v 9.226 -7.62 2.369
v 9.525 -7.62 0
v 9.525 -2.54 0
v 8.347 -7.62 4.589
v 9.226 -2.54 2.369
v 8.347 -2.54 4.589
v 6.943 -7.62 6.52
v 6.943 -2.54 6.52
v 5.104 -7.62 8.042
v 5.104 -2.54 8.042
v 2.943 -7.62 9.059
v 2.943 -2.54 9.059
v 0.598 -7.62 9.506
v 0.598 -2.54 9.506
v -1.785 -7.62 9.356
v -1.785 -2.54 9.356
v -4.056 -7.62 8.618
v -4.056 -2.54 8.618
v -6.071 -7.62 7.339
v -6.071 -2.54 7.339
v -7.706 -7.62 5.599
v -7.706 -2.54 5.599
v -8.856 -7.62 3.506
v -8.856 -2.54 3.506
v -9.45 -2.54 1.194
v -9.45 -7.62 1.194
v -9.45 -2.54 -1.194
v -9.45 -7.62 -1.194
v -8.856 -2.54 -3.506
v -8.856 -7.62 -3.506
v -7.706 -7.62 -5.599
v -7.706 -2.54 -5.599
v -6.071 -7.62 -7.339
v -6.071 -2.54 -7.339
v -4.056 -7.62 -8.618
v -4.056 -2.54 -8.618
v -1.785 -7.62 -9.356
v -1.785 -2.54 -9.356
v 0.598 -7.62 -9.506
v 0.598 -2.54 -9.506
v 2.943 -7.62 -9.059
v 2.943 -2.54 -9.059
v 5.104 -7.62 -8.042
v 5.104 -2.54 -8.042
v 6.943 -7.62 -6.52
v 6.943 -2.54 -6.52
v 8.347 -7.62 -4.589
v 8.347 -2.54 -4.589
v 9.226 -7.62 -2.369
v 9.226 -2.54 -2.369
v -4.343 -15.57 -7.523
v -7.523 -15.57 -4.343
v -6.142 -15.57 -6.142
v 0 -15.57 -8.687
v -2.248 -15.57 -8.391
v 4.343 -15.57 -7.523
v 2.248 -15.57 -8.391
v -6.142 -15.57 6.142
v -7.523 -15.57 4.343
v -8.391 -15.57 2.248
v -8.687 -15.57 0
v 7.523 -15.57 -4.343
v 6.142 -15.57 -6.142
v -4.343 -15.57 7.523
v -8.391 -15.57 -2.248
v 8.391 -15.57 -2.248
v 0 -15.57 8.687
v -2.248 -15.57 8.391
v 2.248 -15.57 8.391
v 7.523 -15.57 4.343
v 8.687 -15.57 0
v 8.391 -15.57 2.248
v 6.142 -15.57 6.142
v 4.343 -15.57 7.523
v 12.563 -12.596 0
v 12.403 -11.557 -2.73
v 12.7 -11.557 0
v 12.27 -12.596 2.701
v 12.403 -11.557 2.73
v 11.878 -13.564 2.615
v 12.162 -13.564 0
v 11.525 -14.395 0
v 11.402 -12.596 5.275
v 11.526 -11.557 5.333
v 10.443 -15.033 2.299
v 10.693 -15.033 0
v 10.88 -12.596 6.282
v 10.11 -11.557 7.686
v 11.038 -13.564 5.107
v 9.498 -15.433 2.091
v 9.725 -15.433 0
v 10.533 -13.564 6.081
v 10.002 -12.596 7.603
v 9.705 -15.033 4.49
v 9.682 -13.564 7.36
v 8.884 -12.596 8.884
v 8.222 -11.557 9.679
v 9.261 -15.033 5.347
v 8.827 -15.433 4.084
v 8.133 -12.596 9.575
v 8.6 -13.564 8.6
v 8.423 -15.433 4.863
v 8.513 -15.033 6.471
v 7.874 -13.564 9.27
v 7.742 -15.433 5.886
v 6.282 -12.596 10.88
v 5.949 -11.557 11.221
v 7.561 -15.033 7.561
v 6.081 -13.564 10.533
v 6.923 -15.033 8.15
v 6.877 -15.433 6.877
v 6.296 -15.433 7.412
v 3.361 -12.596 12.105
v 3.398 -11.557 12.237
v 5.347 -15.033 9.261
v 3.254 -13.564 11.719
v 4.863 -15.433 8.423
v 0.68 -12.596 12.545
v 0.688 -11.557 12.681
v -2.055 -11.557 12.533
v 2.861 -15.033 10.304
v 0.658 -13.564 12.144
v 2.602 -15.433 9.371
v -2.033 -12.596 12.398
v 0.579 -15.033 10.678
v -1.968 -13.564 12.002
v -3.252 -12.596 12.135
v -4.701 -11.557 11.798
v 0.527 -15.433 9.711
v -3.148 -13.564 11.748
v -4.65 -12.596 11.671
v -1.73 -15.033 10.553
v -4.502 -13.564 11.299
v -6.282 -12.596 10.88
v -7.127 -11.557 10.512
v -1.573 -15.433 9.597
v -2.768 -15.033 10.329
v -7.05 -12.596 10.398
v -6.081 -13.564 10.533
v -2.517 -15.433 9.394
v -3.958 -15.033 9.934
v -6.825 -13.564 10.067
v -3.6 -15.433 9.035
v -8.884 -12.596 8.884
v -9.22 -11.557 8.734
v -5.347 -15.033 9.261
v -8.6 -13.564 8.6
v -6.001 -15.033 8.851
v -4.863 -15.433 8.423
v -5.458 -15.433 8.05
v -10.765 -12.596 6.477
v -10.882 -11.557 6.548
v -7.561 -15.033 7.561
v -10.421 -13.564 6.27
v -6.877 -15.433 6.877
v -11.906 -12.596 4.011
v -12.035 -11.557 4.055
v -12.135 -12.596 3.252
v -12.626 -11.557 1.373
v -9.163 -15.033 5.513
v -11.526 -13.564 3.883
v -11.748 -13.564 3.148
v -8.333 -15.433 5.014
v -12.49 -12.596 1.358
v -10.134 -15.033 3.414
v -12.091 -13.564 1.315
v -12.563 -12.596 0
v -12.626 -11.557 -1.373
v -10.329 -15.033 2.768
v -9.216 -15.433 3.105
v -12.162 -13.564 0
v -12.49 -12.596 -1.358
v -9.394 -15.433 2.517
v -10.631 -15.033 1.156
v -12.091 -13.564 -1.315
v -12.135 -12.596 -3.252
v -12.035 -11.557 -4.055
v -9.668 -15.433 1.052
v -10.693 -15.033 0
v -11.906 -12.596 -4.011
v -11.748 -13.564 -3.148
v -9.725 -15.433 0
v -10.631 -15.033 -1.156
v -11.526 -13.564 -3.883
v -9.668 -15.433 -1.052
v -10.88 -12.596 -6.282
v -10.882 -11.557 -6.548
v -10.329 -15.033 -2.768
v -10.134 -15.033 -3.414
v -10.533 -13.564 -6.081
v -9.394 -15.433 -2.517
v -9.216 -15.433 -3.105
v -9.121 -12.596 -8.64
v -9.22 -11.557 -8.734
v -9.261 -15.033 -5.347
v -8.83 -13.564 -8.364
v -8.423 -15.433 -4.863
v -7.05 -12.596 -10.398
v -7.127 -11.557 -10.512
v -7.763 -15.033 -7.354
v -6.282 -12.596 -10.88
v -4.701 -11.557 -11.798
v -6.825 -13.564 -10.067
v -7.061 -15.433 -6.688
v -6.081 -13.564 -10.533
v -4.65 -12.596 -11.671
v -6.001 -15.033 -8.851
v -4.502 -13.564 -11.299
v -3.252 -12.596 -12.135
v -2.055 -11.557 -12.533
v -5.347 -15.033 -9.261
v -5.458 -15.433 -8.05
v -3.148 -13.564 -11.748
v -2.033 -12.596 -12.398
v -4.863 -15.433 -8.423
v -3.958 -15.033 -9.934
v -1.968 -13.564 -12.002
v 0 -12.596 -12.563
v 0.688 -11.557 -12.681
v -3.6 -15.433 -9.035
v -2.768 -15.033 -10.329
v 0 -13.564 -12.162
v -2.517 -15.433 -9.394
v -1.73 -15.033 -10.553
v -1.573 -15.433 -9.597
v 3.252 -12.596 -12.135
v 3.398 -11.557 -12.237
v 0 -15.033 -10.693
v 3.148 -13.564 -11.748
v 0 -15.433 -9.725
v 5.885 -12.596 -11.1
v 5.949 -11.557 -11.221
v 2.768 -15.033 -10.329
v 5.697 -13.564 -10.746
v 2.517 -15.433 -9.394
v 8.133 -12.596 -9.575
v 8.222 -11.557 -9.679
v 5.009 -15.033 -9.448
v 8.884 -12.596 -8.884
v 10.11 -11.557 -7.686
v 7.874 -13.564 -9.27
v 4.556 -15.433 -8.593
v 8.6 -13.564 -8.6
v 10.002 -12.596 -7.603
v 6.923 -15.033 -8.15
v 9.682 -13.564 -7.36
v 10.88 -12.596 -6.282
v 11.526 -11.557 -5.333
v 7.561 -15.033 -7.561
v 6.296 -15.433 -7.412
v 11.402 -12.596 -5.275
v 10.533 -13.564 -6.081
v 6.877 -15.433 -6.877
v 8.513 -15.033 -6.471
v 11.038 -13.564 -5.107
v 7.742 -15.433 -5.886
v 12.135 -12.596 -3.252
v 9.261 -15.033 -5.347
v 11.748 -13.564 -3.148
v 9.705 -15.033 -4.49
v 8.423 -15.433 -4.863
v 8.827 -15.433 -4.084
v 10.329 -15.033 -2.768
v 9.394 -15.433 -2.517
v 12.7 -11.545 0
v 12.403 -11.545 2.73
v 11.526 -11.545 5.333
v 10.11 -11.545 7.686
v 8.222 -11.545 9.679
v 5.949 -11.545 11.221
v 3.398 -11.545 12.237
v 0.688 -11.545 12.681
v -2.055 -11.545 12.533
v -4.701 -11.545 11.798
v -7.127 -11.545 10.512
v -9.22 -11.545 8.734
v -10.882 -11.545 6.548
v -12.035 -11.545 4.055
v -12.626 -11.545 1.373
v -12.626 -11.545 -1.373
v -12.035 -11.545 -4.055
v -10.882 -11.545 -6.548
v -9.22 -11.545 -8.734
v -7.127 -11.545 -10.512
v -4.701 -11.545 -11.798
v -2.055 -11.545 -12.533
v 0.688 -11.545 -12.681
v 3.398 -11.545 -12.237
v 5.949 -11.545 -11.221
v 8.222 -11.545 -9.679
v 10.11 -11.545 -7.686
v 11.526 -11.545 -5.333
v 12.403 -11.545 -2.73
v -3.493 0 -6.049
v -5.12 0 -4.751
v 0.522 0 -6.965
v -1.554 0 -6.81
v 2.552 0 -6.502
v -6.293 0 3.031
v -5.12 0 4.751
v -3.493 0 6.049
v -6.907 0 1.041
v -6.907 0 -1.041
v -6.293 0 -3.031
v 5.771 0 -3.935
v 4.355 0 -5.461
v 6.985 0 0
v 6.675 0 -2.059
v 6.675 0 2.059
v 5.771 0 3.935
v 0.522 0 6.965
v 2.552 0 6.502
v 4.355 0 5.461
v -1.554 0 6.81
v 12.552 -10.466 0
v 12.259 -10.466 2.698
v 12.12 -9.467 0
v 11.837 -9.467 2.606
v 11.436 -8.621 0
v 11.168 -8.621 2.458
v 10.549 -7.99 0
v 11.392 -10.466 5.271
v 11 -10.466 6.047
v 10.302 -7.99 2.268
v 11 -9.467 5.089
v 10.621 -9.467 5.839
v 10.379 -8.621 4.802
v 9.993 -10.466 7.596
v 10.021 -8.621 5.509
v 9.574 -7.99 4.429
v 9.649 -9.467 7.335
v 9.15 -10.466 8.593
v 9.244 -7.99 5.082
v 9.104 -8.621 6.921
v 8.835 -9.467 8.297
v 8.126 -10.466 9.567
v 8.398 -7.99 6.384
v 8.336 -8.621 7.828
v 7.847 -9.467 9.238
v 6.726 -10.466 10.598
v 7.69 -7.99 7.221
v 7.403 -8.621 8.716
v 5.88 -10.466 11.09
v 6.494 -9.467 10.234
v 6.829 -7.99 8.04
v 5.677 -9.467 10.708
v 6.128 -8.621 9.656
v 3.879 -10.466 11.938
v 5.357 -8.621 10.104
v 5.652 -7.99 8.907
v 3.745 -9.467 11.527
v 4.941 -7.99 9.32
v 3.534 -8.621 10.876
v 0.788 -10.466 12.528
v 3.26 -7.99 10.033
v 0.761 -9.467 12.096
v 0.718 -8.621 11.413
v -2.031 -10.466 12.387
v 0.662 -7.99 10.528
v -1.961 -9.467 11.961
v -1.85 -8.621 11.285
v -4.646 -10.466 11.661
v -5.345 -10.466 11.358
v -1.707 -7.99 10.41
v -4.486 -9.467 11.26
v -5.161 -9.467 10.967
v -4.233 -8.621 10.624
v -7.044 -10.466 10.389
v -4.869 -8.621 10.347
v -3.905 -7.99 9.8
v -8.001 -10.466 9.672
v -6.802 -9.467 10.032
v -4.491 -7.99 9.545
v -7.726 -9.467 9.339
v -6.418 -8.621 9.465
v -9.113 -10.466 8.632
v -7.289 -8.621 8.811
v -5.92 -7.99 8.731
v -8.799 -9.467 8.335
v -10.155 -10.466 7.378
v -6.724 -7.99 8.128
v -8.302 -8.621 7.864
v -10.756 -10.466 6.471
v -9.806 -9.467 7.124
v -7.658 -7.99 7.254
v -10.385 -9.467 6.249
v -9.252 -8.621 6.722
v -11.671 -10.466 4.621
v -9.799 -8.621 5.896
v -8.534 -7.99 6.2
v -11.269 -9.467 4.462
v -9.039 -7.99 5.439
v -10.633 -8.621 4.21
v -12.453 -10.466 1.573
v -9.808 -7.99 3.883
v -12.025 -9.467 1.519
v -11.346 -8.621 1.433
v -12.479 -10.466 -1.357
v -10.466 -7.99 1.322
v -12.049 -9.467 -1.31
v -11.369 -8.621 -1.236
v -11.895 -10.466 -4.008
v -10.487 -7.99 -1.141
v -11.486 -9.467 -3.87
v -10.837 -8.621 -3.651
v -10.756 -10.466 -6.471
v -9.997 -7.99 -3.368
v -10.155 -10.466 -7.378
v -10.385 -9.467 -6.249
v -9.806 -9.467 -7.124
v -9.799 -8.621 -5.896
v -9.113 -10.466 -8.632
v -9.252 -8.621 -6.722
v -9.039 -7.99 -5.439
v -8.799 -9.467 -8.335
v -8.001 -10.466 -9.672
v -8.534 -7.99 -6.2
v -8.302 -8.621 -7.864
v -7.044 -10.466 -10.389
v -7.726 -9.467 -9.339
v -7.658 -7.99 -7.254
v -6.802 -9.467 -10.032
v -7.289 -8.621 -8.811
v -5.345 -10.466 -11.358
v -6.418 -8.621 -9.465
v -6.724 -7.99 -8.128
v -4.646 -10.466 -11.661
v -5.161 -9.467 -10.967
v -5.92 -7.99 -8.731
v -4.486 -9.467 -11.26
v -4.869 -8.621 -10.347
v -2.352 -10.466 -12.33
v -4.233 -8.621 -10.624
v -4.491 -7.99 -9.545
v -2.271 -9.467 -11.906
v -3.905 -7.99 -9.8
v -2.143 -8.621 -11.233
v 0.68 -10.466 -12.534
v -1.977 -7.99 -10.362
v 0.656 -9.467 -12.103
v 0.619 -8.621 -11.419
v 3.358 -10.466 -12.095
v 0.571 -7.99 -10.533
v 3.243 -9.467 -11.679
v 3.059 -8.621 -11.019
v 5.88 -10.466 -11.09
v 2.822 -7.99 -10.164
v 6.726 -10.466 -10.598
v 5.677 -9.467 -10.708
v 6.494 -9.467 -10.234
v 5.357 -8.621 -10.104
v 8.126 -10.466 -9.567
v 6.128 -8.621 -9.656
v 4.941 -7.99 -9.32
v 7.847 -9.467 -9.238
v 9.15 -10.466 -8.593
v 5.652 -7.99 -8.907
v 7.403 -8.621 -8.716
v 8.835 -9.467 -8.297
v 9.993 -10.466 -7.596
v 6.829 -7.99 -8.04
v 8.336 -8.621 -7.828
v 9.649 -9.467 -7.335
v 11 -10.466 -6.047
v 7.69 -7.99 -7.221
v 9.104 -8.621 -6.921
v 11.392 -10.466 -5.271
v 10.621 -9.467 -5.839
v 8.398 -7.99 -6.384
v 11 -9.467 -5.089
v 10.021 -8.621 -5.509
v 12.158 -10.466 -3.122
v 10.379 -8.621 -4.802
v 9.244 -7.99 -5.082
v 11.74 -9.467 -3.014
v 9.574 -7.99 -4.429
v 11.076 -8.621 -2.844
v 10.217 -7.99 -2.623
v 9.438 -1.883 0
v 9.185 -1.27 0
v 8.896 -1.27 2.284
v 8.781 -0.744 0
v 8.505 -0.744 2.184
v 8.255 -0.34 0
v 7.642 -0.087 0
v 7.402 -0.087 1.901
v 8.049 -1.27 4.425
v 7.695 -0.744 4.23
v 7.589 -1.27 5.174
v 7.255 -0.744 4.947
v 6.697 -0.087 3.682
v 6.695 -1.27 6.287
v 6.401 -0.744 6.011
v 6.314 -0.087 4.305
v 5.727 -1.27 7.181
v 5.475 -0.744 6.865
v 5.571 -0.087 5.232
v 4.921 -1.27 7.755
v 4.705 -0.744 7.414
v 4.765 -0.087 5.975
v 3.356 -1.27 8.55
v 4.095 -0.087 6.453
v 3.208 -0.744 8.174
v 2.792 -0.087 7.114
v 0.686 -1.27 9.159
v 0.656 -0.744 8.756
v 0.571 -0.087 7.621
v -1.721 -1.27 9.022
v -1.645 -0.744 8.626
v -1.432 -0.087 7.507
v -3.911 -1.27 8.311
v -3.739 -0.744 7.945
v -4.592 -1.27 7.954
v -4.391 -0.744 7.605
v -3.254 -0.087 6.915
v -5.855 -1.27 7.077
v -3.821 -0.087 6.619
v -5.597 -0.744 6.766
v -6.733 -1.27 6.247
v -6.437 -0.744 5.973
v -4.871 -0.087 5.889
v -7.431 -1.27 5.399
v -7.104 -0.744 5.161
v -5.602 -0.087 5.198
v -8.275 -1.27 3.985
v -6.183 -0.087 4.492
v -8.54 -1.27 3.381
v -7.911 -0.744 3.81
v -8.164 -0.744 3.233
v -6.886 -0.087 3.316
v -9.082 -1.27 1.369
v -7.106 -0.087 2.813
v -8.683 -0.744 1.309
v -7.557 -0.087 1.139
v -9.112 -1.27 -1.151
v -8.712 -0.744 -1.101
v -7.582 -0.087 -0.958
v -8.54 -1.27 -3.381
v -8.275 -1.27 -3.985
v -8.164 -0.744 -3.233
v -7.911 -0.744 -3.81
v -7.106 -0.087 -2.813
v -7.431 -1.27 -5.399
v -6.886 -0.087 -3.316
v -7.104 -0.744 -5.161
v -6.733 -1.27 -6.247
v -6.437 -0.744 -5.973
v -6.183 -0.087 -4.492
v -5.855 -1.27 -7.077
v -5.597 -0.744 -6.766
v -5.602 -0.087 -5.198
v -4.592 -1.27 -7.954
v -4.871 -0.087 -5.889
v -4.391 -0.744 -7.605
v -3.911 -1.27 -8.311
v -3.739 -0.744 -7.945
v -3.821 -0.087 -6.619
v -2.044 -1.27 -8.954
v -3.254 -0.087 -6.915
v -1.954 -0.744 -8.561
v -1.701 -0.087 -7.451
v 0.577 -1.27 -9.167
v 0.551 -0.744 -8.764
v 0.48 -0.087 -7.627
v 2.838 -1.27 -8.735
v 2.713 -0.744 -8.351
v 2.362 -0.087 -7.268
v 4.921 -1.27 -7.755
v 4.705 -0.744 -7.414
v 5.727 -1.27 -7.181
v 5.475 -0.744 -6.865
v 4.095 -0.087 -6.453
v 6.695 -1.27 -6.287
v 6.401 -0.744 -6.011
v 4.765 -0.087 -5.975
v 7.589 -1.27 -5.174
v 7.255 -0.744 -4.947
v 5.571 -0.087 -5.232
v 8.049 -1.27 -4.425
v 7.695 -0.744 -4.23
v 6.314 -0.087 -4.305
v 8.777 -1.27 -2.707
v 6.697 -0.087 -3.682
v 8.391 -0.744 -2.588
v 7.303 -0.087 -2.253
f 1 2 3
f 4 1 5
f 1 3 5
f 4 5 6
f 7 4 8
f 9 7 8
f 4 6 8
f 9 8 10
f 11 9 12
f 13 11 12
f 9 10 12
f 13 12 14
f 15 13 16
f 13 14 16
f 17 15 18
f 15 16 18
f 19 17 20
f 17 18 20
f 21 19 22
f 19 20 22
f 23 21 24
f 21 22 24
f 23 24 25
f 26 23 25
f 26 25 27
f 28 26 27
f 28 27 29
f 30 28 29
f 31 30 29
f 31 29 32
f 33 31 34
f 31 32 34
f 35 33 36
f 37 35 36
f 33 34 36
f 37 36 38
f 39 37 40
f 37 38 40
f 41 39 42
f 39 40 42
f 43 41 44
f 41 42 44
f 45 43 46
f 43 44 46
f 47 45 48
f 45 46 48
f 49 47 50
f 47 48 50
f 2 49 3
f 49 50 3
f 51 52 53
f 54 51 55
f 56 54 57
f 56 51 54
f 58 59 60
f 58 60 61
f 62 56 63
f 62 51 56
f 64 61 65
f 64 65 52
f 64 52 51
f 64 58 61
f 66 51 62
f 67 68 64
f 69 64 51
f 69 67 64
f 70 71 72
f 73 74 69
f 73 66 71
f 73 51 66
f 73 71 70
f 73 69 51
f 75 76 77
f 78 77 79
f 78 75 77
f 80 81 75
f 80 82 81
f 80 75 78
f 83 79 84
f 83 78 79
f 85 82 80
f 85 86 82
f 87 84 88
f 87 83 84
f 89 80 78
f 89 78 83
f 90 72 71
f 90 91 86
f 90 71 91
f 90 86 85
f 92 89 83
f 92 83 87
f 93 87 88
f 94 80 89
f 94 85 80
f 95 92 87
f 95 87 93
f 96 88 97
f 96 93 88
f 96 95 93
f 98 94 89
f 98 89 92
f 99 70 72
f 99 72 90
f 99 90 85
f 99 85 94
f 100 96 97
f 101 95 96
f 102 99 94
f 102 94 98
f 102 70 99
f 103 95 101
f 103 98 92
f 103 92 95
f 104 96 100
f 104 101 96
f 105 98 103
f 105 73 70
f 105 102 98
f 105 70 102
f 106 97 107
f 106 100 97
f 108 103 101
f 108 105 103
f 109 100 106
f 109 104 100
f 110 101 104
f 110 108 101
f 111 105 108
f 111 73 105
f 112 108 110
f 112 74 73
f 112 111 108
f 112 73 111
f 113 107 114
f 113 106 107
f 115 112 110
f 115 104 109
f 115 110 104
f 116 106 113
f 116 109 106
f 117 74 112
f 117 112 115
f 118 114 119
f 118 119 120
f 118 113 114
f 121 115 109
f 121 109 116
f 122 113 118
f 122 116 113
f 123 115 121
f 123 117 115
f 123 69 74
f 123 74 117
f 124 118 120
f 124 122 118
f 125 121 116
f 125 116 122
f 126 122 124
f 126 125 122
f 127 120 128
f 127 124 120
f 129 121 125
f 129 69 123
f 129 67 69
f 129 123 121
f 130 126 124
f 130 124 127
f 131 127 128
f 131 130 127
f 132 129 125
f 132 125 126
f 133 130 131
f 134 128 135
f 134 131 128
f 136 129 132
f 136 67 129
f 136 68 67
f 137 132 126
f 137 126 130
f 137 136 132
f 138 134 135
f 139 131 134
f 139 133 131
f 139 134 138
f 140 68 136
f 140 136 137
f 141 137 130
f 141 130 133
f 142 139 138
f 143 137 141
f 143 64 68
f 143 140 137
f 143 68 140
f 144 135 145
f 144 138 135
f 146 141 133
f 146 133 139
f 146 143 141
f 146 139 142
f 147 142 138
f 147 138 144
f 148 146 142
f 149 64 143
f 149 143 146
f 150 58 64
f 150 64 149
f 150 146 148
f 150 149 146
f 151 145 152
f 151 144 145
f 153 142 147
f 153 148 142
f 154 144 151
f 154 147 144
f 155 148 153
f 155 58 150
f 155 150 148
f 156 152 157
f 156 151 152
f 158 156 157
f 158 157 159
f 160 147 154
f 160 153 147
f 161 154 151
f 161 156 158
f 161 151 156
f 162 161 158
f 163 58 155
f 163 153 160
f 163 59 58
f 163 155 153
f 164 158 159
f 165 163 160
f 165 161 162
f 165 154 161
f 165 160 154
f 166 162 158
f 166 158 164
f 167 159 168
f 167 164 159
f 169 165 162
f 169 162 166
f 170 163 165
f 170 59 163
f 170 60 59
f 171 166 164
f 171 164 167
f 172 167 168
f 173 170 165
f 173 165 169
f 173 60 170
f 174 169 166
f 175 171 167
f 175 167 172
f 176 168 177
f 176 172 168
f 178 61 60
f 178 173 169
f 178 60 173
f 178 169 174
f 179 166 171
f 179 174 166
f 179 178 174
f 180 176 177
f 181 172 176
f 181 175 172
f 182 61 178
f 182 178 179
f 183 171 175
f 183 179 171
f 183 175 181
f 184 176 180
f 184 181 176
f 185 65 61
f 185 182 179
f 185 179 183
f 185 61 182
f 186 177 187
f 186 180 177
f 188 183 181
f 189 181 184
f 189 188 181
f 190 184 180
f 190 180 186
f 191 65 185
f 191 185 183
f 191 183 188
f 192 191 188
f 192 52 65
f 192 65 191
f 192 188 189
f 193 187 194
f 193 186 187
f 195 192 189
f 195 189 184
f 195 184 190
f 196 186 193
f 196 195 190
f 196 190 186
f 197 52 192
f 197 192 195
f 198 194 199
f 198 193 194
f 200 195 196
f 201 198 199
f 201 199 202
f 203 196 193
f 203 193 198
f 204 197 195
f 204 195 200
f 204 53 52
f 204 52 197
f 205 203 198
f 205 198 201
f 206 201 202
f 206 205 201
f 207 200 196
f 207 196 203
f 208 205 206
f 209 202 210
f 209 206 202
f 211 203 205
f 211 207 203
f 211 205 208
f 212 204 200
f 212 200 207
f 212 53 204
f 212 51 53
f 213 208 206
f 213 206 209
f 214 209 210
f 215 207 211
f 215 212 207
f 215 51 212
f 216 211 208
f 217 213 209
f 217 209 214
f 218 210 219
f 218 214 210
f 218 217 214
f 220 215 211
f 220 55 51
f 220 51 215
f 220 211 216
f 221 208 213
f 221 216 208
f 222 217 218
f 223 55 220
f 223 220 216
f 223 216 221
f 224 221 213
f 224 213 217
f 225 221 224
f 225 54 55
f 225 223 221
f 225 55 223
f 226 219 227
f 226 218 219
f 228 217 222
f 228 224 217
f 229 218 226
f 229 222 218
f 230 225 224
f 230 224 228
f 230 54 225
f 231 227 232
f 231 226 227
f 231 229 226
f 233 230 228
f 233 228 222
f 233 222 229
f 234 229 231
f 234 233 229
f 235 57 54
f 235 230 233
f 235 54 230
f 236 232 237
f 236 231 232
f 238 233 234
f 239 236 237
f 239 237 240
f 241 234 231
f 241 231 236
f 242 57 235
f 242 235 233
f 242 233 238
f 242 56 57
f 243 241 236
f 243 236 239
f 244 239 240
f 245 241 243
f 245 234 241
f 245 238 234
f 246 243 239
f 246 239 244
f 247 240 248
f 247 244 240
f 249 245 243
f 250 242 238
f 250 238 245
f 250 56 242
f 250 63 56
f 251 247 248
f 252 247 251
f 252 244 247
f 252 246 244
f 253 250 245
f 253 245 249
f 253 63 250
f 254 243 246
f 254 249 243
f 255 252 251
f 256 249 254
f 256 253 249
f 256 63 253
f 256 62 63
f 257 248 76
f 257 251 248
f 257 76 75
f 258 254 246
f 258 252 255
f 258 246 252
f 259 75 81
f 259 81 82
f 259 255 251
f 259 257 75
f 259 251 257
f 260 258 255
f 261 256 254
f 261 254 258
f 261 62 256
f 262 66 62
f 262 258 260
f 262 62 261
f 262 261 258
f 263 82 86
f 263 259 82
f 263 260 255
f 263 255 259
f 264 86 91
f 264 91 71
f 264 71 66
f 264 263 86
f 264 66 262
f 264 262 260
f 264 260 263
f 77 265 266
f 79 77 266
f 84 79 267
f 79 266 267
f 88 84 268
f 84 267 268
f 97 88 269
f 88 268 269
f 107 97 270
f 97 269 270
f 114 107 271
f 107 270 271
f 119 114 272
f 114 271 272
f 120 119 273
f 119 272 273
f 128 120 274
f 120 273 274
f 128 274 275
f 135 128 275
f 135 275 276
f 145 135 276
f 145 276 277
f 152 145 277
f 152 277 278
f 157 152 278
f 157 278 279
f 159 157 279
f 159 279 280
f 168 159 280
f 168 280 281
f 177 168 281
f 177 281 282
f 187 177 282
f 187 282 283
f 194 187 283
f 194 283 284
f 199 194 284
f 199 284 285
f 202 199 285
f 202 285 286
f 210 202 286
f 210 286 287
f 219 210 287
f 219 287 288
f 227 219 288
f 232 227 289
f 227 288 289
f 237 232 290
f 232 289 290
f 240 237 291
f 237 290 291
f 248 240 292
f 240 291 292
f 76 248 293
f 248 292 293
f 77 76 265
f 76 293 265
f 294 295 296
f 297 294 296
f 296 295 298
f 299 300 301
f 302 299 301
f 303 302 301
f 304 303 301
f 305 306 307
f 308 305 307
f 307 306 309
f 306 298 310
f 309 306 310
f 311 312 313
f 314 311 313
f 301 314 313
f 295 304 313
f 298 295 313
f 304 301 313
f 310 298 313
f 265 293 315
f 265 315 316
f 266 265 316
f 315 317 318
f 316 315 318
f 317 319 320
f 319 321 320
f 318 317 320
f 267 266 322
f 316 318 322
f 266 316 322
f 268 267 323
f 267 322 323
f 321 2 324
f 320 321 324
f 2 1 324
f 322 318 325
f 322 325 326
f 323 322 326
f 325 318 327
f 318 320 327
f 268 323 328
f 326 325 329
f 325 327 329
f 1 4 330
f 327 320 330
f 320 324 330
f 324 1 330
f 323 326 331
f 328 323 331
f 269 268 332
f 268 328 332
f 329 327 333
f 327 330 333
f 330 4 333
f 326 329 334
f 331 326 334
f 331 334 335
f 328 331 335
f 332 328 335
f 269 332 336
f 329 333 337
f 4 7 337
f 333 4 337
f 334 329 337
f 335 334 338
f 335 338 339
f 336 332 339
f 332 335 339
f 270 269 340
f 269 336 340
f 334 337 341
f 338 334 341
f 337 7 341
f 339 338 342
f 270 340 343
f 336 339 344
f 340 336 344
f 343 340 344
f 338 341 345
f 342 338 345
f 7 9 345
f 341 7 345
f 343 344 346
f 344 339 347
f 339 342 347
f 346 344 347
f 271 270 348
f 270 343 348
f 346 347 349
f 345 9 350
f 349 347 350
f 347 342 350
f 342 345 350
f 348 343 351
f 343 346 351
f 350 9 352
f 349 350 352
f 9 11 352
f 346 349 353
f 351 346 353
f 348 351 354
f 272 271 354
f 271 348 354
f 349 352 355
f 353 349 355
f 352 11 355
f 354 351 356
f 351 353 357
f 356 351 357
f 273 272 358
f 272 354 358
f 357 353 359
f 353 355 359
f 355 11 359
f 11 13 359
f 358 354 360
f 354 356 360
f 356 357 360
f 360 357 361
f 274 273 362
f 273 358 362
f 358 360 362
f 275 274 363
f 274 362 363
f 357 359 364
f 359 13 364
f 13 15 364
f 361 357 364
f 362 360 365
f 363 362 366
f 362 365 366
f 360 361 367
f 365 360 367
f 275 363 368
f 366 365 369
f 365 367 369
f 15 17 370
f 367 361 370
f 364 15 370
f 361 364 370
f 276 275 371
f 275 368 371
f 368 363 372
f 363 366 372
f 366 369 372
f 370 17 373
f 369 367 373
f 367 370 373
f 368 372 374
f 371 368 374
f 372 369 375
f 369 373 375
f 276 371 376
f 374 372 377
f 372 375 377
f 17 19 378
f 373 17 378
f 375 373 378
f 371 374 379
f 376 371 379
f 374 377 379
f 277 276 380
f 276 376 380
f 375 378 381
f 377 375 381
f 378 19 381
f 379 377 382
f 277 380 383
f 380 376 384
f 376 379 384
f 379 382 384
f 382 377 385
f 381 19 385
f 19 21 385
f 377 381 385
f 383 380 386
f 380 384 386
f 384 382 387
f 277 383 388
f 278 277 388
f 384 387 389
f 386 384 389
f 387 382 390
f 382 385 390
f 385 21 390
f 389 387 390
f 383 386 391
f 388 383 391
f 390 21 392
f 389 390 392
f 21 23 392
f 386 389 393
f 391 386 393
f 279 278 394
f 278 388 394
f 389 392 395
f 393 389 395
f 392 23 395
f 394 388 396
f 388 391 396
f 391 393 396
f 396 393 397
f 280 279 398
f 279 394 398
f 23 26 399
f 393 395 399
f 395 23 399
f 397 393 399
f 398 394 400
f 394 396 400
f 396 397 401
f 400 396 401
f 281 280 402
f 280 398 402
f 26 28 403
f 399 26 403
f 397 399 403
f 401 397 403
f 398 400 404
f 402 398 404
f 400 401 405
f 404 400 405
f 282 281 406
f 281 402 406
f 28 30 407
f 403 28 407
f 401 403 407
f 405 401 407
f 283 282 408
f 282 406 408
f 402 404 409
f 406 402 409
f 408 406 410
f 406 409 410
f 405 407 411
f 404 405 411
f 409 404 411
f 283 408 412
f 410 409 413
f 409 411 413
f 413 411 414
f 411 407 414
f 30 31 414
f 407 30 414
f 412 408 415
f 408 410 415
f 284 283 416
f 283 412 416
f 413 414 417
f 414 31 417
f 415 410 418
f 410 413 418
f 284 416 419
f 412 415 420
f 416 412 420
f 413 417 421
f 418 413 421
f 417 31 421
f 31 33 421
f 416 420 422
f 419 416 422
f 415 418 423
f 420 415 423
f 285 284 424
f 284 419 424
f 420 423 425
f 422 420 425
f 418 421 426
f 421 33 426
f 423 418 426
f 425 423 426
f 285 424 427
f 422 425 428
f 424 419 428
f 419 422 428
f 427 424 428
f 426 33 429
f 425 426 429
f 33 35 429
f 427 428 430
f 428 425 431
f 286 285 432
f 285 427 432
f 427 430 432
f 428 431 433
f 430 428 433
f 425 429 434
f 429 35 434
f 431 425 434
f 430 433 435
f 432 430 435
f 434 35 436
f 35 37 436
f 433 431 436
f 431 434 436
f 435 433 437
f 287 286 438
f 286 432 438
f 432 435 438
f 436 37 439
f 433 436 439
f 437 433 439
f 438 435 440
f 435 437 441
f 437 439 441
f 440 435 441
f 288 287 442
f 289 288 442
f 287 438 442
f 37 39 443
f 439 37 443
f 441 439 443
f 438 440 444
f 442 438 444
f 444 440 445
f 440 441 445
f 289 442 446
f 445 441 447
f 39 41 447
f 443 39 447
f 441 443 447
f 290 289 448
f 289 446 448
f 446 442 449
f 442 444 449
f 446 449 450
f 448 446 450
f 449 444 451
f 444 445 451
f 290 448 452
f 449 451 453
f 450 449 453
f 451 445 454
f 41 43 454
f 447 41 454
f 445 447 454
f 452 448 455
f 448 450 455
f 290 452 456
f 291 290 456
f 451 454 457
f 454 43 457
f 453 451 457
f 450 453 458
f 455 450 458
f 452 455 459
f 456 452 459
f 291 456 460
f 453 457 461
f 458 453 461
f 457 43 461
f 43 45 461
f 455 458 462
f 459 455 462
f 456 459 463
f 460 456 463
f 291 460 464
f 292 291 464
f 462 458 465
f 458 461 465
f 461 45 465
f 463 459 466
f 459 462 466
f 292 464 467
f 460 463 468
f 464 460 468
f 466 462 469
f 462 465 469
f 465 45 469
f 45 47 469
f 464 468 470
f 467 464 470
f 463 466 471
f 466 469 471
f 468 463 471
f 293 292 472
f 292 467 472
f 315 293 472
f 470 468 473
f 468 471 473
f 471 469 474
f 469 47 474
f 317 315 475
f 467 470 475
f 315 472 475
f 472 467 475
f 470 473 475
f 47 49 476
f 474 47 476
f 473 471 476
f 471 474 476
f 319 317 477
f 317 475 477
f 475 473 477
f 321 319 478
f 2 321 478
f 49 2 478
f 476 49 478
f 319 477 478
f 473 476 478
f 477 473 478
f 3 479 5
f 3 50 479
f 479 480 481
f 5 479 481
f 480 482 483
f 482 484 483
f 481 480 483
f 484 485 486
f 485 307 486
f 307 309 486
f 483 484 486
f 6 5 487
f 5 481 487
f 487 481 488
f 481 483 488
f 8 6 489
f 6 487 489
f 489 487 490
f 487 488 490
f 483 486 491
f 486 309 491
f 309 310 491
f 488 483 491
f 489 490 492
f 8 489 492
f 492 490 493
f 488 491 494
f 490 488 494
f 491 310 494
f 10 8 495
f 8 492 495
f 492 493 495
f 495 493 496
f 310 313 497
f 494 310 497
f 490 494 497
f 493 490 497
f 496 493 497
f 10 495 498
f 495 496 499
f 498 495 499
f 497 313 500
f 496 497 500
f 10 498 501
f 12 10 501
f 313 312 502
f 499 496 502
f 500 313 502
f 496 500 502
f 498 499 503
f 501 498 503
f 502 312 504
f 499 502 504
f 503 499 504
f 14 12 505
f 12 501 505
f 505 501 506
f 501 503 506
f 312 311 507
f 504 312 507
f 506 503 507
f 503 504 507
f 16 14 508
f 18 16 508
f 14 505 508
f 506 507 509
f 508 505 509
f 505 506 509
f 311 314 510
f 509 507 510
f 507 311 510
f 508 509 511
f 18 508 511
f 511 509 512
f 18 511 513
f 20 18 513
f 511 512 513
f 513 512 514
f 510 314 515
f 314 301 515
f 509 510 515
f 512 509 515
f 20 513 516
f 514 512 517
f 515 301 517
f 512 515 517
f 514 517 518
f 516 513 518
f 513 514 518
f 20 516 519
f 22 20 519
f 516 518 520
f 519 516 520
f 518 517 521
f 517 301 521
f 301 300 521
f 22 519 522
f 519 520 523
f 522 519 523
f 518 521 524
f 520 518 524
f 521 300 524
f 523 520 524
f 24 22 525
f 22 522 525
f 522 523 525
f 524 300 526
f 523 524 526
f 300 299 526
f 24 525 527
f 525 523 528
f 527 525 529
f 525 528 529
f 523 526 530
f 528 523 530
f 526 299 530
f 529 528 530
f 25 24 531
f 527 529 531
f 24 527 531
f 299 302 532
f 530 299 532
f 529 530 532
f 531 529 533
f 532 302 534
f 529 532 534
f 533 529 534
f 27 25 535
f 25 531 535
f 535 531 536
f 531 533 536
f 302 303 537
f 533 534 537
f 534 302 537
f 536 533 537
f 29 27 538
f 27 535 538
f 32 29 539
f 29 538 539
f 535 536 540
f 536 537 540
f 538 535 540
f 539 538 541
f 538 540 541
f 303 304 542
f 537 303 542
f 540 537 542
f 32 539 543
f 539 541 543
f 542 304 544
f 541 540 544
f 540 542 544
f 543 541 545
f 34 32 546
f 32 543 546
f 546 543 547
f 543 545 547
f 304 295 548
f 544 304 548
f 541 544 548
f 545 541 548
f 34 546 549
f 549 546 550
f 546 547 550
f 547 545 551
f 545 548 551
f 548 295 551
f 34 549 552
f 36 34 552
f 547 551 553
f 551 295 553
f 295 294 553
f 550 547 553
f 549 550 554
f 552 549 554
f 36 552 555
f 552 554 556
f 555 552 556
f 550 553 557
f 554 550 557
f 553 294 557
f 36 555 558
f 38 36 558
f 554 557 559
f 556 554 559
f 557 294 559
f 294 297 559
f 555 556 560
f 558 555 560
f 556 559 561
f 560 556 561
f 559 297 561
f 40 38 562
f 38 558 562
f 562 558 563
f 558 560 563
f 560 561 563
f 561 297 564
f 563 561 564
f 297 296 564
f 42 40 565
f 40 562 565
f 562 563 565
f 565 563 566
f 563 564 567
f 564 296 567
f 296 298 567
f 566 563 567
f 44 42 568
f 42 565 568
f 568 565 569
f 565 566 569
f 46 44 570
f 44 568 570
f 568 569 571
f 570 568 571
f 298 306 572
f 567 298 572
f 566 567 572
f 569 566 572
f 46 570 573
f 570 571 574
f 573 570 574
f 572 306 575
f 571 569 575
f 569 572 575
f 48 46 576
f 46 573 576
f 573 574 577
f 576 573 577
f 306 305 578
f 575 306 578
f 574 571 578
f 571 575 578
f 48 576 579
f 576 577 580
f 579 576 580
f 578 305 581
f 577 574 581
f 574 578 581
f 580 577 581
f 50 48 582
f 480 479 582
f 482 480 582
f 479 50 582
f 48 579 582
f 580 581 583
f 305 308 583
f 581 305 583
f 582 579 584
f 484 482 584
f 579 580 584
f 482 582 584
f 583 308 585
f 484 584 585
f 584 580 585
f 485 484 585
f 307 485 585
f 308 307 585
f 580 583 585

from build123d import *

# Parameters (mm, degrees)
F0_R     = 9.525
F1_DEPTH = 7.62
F2_R     = 12.7
F3_DEPTH = 7.9502
F5_R     = 2.54


# Not quite as in the source:
# - a fillet or chamfer that OpenCascade refuses, or shapes differently, is made with other operations: its cross-section is extruded or revolved along the edge and cut away or added


with BuildPart() as f1:
    # F0 (on Front) → F1 (new body)
    with BuildSketch(Plane.XZ):
        Circle(F0_R)
    extrude(amount=F1_DEPTH)

    # F2 (on face) → F3 (join)
    with BuildSketch(Plane.XZ.offset(7.62)):
        Circle(F2_R)
    extrude(amount=F3_DEPTH)

    # F4: fillet of radius 4.0132 on 2 edges, made by hand

    # F4_s1 → F4_t2 (revolve, cut)
    with BuildSketch(Plane.XY):
        with BuildLine():
            ThreePointArc((12.7, -11.557), (11.5245609343, -14.3947609343), (8.6868, -15.5702))
            Line((8.6868, -15.5702), (12.7, -15.5702))
            Line((12.7, -15.5702), (12.7, -11.557))
        make_face()
    revolve(axis=Axis((0, -15.5702, 0), (0, -1, 0)), mode=Mode.SUBTRACT)

    # F4_s3 → F4_t4 (revolve, cut)
    with BuildSketch(Plane.XY):
        with BuildLine():
            ThreePointArc((12.7, -11.5446904337), (11.8068671852, -9.0206153555), (9.525, -7.62))
            Line((9.525, -7.62), (12.7, -7.62))
            Line((12.7, -7.62), (12.7, -11.5446904337))
        make_face()
    revolve(axis=Axis((0, -7.62, 0), (0, -1, 0)), mode=Mode.SUBTRACT)

    # F5
    f5_edges = [f1.edges().sort_by_distance(p)[0] for p in [
        (-9.525, 0, 0),
    ]]
    fillet(f5_edges, radius=F5_R)


solid = f1.part
